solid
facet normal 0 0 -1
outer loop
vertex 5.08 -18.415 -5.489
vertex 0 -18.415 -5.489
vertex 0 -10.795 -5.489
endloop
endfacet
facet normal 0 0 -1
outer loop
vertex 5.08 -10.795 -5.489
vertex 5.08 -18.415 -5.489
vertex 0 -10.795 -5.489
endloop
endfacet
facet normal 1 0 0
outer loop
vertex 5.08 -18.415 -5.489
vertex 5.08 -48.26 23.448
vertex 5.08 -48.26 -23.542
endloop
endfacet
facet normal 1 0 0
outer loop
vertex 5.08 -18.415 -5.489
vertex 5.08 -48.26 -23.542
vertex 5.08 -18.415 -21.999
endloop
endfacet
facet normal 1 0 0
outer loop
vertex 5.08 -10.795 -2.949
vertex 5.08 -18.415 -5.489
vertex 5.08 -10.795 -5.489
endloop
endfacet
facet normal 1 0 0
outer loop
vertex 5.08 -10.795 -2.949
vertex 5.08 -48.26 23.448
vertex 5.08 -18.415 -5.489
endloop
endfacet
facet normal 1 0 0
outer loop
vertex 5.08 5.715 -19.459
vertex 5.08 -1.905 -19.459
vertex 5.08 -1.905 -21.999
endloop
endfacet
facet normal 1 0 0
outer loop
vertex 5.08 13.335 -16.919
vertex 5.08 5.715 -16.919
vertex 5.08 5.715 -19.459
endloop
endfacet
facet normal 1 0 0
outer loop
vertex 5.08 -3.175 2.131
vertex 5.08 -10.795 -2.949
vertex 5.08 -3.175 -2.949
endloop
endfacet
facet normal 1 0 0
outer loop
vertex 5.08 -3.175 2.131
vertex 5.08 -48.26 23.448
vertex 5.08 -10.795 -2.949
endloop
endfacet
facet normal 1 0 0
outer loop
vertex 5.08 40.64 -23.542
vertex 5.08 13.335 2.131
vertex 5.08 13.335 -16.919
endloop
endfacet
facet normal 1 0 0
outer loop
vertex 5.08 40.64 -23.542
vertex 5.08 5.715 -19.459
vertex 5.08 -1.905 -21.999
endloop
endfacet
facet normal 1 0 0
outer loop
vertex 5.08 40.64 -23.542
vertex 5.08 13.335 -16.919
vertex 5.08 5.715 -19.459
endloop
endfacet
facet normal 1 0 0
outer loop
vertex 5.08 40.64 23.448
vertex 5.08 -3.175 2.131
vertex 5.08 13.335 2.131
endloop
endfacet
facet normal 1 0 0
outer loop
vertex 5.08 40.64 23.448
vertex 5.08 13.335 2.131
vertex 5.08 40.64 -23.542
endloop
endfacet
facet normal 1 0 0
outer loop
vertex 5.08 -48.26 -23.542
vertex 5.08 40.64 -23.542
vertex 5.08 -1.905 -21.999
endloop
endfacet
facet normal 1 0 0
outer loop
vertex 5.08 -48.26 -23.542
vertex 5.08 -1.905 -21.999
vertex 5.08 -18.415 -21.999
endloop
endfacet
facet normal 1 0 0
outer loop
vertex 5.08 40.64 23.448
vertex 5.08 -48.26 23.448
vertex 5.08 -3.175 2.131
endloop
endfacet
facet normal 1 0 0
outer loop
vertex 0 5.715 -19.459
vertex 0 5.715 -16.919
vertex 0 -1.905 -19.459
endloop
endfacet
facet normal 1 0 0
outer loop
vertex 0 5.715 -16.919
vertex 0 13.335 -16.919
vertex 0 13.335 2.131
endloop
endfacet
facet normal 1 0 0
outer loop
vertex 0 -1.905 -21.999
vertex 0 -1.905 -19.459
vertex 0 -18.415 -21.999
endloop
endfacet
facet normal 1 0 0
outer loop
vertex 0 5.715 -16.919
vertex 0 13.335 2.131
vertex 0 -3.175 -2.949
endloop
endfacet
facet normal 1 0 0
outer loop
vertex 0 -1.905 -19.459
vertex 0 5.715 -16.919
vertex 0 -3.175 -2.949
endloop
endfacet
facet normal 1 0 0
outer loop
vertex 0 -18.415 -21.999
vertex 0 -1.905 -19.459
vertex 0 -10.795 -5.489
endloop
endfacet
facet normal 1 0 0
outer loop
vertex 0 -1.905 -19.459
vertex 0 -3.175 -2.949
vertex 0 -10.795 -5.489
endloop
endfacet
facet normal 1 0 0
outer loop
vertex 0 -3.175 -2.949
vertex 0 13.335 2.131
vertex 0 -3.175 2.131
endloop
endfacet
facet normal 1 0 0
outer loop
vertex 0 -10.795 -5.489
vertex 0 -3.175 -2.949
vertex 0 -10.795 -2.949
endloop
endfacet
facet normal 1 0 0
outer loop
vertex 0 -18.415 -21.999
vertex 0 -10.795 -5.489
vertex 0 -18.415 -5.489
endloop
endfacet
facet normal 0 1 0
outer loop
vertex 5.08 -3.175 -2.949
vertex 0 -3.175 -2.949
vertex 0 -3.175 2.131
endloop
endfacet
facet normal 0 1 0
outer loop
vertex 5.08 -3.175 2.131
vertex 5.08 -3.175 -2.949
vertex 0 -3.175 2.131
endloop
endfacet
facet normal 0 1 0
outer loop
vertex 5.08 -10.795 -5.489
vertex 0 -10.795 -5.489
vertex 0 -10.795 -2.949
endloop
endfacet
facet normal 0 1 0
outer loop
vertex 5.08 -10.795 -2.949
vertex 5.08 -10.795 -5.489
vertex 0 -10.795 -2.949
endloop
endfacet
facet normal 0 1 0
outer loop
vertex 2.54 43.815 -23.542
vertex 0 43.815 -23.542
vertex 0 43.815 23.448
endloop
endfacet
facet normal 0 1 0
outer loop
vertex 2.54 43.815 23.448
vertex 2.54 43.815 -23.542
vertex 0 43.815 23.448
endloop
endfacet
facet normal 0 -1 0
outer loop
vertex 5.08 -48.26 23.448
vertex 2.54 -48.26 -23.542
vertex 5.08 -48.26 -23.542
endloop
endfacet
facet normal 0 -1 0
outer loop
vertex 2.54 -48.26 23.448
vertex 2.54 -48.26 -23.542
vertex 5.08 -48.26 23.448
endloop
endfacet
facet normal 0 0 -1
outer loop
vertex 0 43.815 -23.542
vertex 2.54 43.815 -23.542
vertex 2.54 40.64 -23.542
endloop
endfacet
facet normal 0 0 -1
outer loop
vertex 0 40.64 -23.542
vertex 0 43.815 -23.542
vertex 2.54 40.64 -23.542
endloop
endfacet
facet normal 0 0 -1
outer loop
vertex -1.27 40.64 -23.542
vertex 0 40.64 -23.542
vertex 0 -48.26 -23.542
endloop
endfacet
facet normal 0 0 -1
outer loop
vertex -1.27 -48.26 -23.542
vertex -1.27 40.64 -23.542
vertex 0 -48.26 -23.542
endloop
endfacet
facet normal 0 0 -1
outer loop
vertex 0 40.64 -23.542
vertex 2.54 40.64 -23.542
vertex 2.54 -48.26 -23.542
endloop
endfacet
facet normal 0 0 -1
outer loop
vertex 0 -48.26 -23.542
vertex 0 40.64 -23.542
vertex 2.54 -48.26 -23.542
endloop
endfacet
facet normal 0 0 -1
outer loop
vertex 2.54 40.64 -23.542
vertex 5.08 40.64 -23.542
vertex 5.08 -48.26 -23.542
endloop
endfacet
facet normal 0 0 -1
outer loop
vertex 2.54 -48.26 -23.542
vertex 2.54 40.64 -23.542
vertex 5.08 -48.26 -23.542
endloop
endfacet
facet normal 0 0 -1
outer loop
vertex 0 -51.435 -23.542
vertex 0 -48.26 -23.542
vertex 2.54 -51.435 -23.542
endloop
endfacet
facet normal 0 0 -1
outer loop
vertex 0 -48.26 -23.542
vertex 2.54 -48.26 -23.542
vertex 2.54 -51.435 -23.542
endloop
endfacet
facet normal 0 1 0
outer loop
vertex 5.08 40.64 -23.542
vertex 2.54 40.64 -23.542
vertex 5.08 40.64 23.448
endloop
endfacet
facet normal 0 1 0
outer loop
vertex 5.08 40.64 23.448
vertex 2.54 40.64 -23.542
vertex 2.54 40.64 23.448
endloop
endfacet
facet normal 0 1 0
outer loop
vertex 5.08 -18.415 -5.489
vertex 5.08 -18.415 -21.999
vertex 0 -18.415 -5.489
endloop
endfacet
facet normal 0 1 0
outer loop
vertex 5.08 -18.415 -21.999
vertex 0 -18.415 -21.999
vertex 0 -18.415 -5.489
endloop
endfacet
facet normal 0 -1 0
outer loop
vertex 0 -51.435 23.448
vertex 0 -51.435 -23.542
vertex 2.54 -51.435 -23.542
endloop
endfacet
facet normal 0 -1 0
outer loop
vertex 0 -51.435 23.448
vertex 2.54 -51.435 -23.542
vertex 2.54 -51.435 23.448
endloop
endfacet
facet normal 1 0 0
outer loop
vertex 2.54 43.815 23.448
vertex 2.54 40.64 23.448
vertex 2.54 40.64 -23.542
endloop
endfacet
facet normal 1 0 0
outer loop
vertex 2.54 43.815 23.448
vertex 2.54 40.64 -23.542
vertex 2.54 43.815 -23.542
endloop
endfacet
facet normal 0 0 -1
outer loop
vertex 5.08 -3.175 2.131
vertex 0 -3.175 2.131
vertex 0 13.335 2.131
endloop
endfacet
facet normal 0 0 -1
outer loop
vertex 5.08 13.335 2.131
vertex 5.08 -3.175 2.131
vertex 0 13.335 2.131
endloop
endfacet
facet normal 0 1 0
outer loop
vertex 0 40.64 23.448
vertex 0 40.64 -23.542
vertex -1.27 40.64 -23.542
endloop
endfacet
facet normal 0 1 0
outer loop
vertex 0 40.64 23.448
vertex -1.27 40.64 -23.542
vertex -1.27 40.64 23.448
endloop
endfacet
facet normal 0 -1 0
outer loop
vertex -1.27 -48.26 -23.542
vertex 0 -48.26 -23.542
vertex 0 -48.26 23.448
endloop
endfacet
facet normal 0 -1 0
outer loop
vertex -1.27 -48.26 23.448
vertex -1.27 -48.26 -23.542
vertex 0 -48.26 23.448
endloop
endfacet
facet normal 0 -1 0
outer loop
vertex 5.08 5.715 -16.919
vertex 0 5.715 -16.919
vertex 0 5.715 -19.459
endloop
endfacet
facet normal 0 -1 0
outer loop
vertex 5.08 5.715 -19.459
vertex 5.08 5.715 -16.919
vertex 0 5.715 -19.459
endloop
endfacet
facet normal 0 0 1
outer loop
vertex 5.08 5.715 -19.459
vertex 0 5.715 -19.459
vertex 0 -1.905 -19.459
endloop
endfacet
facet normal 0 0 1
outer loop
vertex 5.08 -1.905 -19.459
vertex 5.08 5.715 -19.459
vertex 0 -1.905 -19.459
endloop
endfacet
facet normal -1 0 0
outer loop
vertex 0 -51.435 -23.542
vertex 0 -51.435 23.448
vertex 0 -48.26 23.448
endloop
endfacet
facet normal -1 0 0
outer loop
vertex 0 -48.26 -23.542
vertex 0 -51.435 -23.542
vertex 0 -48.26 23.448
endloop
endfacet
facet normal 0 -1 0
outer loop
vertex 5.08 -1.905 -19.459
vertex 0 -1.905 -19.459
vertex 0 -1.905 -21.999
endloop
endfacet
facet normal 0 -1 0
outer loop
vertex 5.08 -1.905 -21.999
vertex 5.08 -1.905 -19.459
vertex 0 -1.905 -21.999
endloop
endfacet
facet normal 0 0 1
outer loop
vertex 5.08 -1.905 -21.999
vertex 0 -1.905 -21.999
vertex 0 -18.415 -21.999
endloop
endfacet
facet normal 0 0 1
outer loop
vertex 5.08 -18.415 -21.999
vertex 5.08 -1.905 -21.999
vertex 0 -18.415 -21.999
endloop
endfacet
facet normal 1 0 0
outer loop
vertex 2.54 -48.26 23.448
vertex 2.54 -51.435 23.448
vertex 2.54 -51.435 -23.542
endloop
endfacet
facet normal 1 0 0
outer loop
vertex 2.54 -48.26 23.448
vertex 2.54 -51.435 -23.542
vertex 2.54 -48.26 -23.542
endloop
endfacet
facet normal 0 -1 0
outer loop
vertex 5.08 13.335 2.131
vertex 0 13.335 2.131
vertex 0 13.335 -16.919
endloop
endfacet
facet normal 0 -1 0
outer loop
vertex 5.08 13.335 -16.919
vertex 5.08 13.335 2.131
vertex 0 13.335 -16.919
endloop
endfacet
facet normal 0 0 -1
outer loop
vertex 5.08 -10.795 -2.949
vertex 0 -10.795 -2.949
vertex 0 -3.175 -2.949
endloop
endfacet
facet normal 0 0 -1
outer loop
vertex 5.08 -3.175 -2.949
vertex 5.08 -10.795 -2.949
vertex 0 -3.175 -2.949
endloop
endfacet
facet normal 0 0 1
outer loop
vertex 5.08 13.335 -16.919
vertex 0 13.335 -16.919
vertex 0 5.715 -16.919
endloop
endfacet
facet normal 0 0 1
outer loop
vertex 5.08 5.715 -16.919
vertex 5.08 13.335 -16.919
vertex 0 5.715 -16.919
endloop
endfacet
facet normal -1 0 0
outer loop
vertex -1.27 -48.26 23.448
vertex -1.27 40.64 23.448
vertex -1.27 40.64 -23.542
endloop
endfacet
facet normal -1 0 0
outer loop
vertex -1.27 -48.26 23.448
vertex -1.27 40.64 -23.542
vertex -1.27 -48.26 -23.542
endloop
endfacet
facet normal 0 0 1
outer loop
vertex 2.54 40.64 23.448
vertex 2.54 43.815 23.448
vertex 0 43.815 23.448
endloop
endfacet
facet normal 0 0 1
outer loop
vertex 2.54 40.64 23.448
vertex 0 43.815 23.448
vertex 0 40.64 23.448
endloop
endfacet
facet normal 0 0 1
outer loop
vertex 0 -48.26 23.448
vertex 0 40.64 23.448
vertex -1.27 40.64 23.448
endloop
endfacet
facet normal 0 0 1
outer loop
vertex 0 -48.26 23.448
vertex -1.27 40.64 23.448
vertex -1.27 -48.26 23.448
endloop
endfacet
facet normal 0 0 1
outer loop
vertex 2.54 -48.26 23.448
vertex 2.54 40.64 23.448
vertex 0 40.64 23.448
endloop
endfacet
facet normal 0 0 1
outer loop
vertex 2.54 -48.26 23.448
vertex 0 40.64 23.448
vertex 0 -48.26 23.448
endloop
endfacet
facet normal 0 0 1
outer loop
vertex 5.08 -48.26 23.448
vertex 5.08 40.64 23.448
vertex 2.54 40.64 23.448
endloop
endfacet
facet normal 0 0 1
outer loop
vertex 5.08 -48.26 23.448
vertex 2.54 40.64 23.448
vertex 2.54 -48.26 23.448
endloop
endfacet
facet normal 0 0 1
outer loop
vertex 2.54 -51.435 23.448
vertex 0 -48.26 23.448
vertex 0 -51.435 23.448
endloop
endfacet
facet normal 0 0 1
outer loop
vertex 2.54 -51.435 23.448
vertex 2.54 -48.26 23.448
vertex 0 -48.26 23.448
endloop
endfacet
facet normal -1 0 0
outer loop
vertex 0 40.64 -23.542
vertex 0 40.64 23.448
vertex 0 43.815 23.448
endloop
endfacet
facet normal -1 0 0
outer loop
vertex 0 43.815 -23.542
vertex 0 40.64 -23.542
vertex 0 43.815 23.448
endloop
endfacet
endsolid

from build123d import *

# Parameters (mm, degrees)
F0_W     = 95.25
F0_H     = 46.99
F1_DEPTH = 2.54
F2_W     = 88.9
F2_H     = 46.99
F3_DEPTH = 2.54
F4_W     = 88.9
F4_H     = 46.99
F5_DEPTH = 1.27


with BuildPart() as f1:
    # F0 (on Right) → F1 (new body)
    with BuildSketch(Plane.YZ):
        with Locations((-3.81, -0.0466339131)):
            Rectangle(F0_W, F0_H)
        Polygon((-3.175, -2.9486645812), (-3.175, 2.1313354188), (13.335, 2.1313354188), (13.335, -16.9186645812), (5.715, -16.9186645812), (5.715, -19.4586645812), (-1.905, -19.4586645812), (-1.905, -21.9986645812), (-18.415, -21.9986645812), (-18.415, -5.4886645812), (-10.795, -5.4886645812), (-10.795, -2.9486645812), align=None, mode=Mode.SUBTRACT)
    extrude(amount=F1_DEPTH)

    # F2 (on face) → F3 (join)
    with BuildSketch(Plane.YZ.offset(2.54)):
        with Locations((-3.81, -0.0466339131)):
            Rectangle(F2_W, F2_H)
        Polygon((-18.415, -21.9986645812), (-18.415, -5.4886645812), (-10.795, -5.4886645812), (-10.795, -2.9486645812), (-3.175, -2.9486645812), (-3.175, 2.1313354188), (13.335, 2.1313354188), (13.335, -16.9186645812), (5.715, -16.9186645812), (5.715, -19.4586645812), (-1.905, -19.4586645812), (-1.905, -21.9986645812), align=None, mode=Mode.SUBTRACT)
    extrude(amount=F3_DEPTH)

    # F4 (on face) → F5 (join)
    with BuildSketch(Plane(origin=(0, 0, 0), x_dir=(0, -1, 0), z_dir=(-1, 0, 0))):
        with Locations((3.81, -0.0466339131)):
            Rectangle(F4_W, F4_H)
        Polygon((10.795, -2.9486645812), (10.795, -5.4886645812), (18.415, -5.4886645812), (18.415, -21.9986645812), (1.905, -21.9986645812), (1.905, -19.4586645812), (-5.715, -19.4586645812), (-5.715, -16.9186645812), (-13.335, -16.9186645812), (-13.335, 2.1313354188), (3.175, 2.1313354188), (3.175, -2.9486645812), align=None, mode=Mode.SUBTRACT)
        Polygon((18.415, -5.4886645812), (10.795, -5.4886645812), (10.795, -2.9486645812), (3.175, -2.9486645812), (3.175, 2.1313354188), (-13.335, 2.1313354188), (-13.335, -16.9186645812), (-5.715, -16.9186645812), (-5.715, -19.4586645812), (1.905, -19.4586645812), (1.905, -21.9986645812), (18.415, -21.9986645812), align=None)
    extrude(amount=F5_DEPTH)


solid = f1.part
